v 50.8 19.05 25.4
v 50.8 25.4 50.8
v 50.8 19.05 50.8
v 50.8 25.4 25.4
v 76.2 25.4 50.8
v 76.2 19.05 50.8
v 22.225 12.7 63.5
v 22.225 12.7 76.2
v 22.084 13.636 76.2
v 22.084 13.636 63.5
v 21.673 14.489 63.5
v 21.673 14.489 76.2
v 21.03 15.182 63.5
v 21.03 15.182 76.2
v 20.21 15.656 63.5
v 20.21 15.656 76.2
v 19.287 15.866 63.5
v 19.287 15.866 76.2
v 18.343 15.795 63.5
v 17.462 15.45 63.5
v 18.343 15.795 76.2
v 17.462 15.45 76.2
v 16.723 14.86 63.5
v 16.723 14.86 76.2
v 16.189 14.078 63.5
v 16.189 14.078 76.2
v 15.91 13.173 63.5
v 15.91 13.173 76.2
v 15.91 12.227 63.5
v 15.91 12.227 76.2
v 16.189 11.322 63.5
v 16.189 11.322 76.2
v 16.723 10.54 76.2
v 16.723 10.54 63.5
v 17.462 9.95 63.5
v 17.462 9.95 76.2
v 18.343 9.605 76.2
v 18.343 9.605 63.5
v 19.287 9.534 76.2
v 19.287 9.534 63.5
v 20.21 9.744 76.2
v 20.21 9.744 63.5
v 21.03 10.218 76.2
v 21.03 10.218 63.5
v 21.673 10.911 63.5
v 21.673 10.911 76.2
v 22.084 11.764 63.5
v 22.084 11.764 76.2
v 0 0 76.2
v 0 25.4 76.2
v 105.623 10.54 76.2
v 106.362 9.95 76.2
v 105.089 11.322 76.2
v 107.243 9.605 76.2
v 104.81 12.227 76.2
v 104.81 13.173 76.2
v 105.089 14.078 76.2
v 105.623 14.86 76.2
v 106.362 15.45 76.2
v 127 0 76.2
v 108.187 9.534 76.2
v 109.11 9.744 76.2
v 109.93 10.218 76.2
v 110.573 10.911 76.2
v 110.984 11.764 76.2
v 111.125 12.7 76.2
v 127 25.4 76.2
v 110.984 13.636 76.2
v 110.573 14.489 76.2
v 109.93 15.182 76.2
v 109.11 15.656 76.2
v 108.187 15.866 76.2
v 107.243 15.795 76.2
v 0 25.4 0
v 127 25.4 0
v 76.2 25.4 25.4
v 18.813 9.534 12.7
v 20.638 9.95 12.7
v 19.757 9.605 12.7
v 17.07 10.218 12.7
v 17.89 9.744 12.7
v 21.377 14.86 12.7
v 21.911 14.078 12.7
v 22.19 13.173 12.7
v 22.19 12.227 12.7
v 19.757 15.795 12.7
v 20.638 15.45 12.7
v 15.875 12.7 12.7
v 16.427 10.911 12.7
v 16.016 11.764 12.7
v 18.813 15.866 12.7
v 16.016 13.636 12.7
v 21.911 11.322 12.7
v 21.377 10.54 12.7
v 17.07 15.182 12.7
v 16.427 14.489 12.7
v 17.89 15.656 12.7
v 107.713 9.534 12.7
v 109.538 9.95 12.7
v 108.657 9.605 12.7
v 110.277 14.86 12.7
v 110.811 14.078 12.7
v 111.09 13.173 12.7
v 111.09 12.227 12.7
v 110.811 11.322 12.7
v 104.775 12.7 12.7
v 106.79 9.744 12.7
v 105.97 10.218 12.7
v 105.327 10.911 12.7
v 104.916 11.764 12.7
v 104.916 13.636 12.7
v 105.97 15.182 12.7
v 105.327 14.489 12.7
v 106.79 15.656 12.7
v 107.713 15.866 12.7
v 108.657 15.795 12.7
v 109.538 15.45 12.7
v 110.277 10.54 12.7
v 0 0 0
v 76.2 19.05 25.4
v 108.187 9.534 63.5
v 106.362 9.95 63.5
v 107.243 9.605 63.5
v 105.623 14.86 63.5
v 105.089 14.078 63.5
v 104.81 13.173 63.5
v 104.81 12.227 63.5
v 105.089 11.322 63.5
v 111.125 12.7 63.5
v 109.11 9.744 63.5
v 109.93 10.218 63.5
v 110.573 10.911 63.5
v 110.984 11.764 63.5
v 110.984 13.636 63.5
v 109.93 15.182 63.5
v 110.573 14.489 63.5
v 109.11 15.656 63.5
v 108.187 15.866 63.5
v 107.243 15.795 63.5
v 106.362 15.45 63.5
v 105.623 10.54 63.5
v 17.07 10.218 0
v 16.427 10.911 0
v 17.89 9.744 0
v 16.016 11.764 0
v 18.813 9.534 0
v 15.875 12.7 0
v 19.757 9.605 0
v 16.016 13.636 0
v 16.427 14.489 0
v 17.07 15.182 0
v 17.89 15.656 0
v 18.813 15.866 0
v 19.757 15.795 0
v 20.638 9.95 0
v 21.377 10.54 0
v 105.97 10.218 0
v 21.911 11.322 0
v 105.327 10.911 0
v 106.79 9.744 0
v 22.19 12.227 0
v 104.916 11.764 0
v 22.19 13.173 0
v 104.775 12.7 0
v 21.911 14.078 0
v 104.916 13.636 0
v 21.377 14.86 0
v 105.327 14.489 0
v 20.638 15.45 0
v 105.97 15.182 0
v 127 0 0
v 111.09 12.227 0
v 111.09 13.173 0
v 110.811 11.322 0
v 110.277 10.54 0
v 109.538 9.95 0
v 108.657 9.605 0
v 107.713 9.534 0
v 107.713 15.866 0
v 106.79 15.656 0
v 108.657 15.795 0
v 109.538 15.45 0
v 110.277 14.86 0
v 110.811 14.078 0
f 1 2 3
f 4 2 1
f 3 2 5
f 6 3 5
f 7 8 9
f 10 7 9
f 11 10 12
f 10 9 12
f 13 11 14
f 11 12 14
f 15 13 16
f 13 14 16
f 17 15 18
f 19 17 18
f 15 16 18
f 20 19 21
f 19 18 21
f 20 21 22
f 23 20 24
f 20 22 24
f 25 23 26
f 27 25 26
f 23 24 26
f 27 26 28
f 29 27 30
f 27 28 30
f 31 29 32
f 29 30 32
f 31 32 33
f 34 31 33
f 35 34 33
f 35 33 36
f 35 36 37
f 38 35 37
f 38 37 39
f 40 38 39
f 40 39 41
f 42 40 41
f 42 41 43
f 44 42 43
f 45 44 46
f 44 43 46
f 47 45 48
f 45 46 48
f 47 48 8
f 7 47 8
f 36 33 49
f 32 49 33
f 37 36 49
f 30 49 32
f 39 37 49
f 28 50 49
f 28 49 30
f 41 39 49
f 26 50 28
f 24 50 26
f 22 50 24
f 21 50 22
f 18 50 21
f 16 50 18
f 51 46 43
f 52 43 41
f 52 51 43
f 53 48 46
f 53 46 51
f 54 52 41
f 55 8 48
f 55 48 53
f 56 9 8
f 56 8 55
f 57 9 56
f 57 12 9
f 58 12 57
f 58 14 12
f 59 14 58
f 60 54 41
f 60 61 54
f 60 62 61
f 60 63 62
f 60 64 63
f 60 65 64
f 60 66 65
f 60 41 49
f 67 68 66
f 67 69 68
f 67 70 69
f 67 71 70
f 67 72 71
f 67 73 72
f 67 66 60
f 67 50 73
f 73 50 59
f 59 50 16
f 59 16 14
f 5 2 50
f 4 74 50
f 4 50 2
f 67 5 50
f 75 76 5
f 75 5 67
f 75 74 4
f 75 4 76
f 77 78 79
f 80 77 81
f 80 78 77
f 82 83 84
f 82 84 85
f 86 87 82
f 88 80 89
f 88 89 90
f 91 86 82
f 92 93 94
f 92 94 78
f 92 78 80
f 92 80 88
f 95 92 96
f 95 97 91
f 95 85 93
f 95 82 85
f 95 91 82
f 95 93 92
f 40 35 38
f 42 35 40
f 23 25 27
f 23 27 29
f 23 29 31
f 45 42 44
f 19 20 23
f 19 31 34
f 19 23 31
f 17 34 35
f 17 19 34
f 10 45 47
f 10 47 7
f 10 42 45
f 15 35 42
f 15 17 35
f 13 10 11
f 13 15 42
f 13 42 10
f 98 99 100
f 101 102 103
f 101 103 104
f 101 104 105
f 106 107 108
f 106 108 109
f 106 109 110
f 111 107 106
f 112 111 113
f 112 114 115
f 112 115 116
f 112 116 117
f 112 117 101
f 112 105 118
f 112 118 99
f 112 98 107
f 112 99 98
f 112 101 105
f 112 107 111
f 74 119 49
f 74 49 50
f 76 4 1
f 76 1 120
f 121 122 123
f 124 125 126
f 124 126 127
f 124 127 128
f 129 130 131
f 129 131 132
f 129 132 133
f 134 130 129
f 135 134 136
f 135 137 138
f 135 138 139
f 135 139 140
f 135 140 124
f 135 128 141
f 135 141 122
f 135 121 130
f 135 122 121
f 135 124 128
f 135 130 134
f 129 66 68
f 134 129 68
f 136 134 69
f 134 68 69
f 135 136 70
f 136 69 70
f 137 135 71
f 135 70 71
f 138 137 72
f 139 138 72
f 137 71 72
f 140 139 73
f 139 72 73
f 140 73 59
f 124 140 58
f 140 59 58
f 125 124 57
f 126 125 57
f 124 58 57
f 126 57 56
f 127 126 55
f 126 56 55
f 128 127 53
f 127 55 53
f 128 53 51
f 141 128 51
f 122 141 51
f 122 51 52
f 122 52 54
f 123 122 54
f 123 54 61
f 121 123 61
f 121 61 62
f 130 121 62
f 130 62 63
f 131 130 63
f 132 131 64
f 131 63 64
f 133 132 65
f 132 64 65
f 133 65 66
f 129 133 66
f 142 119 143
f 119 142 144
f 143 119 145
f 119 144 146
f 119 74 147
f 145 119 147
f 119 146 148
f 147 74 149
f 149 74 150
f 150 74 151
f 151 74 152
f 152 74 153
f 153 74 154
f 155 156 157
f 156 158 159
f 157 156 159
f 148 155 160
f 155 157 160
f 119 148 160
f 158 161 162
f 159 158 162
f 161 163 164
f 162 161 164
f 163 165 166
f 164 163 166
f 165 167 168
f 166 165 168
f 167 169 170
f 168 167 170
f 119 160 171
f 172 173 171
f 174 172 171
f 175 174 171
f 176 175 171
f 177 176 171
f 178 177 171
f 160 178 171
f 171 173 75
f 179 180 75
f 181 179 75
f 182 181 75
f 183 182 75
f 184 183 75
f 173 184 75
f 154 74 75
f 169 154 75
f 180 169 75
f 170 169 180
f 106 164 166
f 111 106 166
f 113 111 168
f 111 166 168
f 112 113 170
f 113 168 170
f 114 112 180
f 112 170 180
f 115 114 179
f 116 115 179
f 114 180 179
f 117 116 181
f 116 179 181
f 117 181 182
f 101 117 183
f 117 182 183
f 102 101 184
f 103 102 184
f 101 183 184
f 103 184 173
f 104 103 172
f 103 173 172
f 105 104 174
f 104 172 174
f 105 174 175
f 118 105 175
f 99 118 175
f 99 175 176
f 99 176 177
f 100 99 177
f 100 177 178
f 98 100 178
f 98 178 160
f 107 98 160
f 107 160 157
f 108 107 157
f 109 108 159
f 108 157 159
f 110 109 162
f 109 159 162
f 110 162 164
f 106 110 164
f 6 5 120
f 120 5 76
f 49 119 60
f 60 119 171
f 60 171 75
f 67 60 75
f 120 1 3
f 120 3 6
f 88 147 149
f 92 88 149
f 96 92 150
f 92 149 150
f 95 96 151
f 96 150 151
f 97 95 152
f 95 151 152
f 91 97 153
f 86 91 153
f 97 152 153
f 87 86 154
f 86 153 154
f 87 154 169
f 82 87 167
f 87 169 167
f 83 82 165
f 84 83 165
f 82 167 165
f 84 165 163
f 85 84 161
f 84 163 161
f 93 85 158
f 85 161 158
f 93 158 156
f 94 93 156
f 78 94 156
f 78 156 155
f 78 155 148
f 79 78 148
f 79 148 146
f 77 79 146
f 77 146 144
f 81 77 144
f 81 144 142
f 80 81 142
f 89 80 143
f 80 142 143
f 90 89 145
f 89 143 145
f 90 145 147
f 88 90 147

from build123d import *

# Parameters (mm, degrees)
SKETCH1_W           = 127
SKETCH1_H           = 25.4
BOSS_EXTRUDE1_DEPTH = 76.2
SKETCH2_R           = 3.175
CUT_EXTRUDE1_DEPTH  = 12.7
SKETCH3_R           = 3.175
CUT_EXTRUDE2_DEPTH  = 12.7
SKETCH4_W           = 25.4
SKETCH4_H           = 25.4
CUT_EXTRUDE3_DEPTH  = 6.35


with BuildPart() as part:
    # Sketch1 → Boss-Extrude1 (new body)
    with BuildSketch(Plane.XY):
        with Locations((63.5, 12.7)):
            Rectangle(SKETCH1_W, SKETCH1_H)
    extrude(amount=BOSS_EXTRUDE1_DEPTH)

    # Sketch2 → Cut-Extrude1 (cut)
    with BuildSketch(Plane.XY.offset(76.2)):
        with Locations((19.05, 12.7)):
            Circle(SKETCH2_R)
        with Locations((107.95, 12.7)):
            Circle(SKETCH2_R)
    extrude(amount=-CUT_EXTRUDE1_DEPTH, mode=Mode.SUBTRACT)

    # Sketch3 → Cut-Extrude2 (cut)
    with BuildSketch(Plane(origin=(0, 0, 0), x_dir=(-1, 0, 0), z_dir=(0, 0, -1))):
        with Locations((-107.95, 12.7)):
            Circle(SKETCH3_R)
        with Locations((-19.05, 12.7)):
            Circle(SKETCH3_R)
    extrude(amount=-CUT_EXTRUDE2_DEPTH, mode=Mode.SUBTRACT)

    # Sketch4 → Cut-Extrude3 (cut)
    with BuildSketch(Plane(origin=(0, 25.4, 0), x_dir=(1, 0, 0), z_dir=(0, 1, 0))):
        with Locations((63.5, -38.1)):
            Rectangle(SKETCH4_W, SKETCH4_H)
    extrude(amount=-CUT_EXTRUDE3_DEPTH, mode=Mode.SUBTRACT)


solid = part.part
